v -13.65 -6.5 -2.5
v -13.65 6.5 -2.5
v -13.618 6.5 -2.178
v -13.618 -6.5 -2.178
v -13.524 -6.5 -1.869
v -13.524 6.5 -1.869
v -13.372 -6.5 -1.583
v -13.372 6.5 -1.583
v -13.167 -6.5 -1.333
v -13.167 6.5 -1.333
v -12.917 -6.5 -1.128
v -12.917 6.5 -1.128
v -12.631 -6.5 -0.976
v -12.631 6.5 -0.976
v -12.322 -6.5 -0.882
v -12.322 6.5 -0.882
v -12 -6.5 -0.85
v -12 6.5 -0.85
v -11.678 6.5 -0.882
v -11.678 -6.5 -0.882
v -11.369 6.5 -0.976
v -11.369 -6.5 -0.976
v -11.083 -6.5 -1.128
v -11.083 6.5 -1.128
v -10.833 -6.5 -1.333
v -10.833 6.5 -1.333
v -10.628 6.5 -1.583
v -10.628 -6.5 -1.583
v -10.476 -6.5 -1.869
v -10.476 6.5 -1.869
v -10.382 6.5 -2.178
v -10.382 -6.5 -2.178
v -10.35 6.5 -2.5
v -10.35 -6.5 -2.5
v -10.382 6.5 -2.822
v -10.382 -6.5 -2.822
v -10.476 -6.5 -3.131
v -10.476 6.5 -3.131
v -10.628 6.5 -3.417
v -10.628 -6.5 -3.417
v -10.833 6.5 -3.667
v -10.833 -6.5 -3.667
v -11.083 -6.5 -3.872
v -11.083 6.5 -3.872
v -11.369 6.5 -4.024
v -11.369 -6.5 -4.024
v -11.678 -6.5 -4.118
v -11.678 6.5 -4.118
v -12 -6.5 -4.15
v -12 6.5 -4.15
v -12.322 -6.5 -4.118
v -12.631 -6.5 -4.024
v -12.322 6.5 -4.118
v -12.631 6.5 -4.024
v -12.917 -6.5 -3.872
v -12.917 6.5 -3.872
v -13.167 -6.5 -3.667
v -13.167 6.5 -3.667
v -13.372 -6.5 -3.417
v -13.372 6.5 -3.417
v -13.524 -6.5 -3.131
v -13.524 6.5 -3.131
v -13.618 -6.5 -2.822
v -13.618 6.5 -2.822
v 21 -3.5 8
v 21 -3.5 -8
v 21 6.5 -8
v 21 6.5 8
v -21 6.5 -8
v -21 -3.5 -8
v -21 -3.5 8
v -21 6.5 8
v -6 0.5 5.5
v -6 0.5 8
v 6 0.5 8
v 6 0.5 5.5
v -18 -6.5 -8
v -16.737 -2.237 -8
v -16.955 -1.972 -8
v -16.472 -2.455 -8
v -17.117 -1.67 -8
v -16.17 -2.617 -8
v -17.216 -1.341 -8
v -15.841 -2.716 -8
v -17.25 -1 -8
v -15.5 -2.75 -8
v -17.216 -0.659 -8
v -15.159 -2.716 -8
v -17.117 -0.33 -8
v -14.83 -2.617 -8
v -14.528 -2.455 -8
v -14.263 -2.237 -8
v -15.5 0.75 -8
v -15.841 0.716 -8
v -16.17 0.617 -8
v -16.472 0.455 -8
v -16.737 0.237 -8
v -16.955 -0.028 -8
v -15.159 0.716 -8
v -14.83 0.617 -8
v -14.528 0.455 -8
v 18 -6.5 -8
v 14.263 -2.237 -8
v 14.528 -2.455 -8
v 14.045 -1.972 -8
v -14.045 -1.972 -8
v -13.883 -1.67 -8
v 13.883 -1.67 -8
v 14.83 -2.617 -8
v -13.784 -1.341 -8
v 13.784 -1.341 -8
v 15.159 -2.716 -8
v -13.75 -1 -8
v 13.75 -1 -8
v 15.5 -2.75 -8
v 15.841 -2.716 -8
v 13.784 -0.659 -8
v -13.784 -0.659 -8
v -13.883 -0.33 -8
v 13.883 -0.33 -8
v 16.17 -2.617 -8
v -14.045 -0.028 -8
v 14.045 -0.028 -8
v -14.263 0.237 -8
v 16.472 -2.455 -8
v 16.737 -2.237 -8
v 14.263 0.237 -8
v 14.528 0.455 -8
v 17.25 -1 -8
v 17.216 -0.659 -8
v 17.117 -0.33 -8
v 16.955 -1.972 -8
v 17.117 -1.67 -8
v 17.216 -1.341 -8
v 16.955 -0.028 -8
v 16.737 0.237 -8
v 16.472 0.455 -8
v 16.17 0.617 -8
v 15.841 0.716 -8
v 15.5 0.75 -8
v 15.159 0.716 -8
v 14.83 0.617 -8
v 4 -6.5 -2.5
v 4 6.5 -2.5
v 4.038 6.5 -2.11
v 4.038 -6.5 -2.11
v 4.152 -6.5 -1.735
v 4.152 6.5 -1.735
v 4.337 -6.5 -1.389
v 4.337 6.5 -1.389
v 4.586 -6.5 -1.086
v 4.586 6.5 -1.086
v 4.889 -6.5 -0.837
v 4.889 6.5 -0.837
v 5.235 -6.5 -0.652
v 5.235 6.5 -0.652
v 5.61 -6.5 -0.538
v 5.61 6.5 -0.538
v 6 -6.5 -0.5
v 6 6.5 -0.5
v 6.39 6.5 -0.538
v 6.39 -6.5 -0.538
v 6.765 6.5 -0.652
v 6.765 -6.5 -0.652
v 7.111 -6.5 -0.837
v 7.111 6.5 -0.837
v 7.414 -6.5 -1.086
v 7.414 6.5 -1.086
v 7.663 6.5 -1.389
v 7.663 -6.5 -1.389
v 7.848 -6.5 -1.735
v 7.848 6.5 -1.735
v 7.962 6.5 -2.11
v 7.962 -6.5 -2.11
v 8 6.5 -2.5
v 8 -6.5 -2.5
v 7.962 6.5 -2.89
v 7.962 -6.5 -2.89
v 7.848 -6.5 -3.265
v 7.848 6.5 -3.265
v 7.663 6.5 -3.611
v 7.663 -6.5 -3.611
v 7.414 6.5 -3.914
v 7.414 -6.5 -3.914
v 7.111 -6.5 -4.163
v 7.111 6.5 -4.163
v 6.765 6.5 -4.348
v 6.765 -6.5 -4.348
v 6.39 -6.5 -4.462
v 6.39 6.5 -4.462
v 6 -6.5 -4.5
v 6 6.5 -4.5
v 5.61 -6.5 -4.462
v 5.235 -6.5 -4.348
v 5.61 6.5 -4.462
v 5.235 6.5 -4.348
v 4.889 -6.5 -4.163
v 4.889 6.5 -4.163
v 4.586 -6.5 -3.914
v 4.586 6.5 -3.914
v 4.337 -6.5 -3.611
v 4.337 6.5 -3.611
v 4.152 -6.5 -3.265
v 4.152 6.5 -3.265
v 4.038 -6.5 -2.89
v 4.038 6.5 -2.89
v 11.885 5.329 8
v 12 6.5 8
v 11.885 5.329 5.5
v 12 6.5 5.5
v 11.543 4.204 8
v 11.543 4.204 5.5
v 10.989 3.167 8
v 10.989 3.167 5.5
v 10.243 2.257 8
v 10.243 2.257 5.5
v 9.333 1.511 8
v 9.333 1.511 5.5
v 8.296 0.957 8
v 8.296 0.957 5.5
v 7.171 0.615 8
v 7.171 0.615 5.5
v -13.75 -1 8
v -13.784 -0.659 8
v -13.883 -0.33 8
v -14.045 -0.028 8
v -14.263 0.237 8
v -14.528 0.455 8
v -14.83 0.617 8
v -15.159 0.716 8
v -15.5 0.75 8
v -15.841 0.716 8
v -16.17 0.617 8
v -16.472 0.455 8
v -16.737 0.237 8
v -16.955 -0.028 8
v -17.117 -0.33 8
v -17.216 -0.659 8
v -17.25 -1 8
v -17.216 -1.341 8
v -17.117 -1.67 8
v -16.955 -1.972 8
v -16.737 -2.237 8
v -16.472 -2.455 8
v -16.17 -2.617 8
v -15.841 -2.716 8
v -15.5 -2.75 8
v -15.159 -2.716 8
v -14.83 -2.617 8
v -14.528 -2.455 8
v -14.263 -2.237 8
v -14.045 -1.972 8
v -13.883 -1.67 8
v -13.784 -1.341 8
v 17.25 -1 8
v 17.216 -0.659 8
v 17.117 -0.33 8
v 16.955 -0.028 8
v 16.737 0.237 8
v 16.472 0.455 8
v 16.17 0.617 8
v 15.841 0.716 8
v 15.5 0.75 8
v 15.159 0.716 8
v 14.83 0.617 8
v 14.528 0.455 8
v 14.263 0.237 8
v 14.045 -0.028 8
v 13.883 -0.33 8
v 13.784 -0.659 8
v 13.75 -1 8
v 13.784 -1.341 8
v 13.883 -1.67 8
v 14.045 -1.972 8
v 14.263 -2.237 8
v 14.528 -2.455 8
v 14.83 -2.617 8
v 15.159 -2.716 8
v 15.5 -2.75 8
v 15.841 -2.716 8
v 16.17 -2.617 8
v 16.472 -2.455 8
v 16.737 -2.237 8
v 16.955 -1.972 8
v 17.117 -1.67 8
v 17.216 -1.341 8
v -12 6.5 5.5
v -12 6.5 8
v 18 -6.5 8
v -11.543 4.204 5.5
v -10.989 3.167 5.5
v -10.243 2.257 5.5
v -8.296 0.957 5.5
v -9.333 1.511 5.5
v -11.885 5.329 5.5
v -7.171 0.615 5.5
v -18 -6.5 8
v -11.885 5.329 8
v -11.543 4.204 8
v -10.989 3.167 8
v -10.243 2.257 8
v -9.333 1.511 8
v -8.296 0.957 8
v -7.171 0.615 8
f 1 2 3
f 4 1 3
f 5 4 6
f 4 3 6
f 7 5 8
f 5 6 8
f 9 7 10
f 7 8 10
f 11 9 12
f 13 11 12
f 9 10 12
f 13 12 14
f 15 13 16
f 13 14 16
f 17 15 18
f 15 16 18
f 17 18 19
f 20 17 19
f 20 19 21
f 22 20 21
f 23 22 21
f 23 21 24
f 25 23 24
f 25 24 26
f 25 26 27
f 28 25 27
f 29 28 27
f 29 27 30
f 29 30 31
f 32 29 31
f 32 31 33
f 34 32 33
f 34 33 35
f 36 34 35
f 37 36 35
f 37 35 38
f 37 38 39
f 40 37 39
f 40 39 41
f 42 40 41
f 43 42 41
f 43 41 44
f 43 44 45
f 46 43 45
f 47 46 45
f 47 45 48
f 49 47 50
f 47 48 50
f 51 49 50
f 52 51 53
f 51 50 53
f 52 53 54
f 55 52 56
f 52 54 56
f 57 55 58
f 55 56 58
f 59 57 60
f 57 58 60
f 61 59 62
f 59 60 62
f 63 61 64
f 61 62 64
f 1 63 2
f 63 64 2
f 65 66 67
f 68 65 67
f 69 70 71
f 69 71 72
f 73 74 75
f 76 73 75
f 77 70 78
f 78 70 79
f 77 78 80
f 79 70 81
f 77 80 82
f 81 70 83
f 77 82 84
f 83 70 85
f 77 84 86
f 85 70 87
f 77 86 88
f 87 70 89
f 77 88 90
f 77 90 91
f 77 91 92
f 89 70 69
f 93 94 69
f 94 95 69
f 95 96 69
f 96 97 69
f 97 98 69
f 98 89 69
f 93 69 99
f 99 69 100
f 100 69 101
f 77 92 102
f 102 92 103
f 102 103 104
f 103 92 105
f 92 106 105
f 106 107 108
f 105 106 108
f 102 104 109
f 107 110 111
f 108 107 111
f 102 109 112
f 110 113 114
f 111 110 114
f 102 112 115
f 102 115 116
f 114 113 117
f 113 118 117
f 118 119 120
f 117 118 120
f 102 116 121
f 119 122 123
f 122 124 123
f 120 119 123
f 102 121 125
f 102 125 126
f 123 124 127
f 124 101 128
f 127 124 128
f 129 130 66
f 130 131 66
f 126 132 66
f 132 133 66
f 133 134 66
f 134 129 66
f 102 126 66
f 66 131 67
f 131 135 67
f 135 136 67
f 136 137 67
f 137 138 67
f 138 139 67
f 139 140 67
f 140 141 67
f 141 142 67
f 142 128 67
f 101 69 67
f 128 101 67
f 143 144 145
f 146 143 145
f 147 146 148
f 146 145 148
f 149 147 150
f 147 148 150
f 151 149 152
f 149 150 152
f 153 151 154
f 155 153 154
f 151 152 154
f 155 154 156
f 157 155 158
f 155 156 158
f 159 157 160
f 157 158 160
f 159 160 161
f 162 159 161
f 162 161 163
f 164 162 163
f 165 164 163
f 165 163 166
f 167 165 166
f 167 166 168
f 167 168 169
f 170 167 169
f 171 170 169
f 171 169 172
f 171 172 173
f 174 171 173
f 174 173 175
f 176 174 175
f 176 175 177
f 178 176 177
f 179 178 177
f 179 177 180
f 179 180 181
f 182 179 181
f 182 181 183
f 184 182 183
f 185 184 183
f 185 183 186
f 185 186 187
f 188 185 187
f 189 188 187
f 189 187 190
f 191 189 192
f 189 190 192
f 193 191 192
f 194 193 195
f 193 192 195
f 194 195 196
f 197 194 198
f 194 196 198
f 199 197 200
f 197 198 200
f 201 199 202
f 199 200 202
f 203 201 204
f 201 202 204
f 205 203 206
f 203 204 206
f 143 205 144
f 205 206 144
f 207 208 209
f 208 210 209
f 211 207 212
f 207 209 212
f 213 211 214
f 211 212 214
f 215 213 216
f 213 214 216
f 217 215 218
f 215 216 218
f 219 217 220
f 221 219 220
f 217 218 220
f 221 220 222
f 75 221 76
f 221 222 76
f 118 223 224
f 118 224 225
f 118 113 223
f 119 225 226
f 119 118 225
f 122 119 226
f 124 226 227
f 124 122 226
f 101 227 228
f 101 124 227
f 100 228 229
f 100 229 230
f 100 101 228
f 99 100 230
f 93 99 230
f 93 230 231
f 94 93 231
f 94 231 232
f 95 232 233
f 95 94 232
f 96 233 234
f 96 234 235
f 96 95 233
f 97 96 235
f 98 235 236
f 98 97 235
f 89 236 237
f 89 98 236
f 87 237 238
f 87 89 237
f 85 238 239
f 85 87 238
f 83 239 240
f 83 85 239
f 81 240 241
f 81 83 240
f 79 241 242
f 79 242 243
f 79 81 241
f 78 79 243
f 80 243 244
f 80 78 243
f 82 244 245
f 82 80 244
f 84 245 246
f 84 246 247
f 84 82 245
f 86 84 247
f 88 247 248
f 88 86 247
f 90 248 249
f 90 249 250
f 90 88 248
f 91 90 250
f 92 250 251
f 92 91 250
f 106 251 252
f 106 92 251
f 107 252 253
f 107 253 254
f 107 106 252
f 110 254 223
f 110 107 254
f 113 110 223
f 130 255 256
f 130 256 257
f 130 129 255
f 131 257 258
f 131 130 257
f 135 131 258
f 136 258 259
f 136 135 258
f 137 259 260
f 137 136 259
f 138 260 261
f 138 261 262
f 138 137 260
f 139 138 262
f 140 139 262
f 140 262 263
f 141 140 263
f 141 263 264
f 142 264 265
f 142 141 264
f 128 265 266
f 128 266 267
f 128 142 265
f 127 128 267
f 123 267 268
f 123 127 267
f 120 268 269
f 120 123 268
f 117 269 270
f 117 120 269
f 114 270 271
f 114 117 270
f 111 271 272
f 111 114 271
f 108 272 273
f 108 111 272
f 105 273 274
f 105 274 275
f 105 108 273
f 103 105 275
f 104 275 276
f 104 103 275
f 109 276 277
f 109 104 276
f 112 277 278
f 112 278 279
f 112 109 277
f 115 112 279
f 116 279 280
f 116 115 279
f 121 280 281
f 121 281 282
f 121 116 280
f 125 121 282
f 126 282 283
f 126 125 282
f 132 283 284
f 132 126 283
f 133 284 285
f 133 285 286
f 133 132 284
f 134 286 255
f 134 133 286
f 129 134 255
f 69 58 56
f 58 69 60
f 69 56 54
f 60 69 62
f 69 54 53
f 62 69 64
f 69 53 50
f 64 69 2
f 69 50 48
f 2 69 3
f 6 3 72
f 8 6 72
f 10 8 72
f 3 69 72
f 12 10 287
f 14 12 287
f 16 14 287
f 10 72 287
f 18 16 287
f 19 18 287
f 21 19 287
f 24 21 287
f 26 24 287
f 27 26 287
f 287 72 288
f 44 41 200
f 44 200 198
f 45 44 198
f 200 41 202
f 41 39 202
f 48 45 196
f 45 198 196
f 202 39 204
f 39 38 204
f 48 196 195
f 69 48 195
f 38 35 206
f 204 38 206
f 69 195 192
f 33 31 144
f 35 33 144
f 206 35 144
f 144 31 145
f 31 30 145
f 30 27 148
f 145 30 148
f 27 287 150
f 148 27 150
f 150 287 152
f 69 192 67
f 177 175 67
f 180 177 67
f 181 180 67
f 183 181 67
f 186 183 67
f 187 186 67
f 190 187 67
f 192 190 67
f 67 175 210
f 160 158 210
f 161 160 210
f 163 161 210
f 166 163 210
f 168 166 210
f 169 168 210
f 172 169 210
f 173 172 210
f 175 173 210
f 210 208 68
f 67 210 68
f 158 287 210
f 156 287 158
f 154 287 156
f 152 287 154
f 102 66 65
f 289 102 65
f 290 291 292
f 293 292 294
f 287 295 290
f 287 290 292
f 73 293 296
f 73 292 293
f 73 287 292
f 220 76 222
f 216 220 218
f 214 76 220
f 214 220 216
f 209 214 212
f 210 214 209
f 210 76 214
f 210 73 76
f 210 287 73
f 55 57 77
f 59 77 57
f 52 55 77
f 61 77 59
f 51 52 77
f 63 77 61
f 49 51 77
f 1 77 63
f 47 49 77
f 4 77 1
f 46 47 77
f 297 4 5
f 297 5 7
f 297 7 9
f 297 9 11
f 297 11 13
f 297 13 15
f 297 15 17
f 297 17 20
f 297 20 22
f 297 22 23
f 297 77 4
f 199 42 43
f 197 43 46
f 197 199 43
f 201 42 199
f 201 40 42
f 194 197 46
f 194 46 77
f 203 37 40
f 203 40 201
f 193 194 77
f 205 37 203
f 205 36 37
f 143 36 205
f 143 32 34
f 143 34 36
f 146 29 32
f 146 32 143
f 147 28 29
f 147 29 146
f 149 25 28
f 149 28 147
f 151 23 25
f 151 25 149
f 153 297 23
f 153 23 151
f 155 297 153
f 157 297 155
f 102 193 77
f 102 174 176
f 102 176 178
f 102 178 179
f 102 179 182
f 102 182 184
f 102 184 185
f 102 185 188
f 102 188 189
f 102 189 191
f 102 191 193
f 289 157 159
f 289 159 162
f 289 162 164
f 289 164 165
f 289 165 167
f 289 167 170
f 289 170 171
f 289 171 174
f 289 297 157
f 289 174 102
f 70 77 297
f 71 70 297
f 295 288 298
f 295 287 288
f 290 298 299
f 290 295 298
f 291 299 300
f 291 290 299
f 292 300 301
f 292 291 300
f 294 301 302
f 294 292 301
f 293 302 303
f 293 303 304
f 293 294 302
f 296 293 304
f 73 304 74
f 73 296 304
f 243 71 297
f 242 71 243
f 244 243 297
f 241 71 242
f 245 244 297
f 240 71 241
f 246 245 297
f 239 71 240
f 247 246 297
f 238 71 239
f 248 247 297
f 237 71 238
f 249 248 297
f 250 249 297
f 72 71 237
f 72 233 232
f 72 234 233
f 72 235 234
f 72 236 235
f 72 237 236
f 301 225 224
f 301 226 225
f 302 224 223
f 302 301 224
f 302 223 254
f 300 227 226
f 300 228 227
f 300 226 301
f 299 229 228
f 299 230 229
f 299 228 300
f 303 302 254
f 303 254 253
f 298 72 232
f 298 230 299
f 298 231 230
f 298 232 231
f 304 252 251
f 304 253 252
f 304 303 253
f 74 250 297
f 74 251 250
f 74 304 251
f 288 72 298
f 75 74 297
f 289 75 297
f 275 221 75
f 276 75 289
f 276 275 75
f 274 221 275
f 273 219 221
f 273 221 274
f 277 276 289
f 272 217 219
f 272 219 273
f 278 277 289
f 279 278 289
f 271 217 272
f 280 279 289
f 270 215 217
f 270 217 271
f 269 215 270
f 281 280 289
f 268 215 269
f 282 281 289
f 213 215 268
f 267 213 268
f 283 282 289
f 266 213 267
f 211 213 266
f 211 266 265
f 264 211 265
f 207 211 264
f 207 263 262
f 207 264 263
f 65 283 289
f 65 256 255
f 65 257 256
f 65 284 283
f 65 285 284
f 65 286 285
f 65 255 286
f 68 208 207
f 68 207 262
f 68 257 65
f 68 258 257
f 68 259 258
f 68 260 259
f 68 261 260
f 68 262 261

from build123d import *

# Parameters (mm, degrees)
F0_W     = 42
F0_H     = 13
F0_R     = 1.75
F1_DEPTH = 8
F2_W     = 24
F2_H     = 6
F3_DEPTH = 2.5
F4_R     = 5.99999
F5_SIZE  = 3
F6_R     = 1.65
F6_R_2   = 2
F7_DEPTH = 13.001


# Not quite as in the source:
# - a fillet or chamfer is up to 0.001 mm smaller than in the source, because OpenCascade refuses the exact size


with BuildPart() as f1:
    # F0 (on Top) → F1 (new body, symmetric)
    with BuildSketch(Plane.XY):
        Rectangle(F0_W, F0_H)
        with Locations((-15.5, -1)):
            Circle(F0_R, mode=Mode.SUBTRACT)
        with Locations((15.5, -1)):
            Circle(F0_R, mode=Mode.SUBTRACT)
    extrude(amount=F1_DEPTH, both=True)

    # F2 (on face) → F3 (cut)
    with BuildSketch(Plane.XY.offset(8)):
        with Locations((0, 3.5)):
            Rectangle(F2_W, F2_H)
    extrude(amount=-F3_DEPTH, mode=Mode.SUBTRACT)

    # F4 (radius 6 in the source; OpenCascade refuses exactly that, so slightly less here)
    f4_edges = [f1.edges().sort_by_distance(p)[0] for p in [
        (-12, 0.5, 6.75),
        (12, 0.5, 6.75),
    ]]
    fillet(f4_edges, radius=F4_R)

    # F5
    f5_edges = [f1.edges().sort_by_distance(p)[0] for p in [
        (-21, -6.5, 0),
        (21, -6.5, 0),
    ]]
    chamfer(f5_edges, length=F5_SIZE)

    # F6 (on face) → F7 (cut, through all)
    with BuildSketch(Plane(origin=(0, 6.5, 0), x_dir=(-1, 0, 0), z_dir=(0, 1, 0))):
        with Locations((12, -2.5)):
            Circle(F6_R)
        with Locations((-6, -2.5)):
            Circle(F6_R_2)
    extrude(amount=-F7_DEPTH, mode=Mode.SUBTRACT)


solid = f1.part
